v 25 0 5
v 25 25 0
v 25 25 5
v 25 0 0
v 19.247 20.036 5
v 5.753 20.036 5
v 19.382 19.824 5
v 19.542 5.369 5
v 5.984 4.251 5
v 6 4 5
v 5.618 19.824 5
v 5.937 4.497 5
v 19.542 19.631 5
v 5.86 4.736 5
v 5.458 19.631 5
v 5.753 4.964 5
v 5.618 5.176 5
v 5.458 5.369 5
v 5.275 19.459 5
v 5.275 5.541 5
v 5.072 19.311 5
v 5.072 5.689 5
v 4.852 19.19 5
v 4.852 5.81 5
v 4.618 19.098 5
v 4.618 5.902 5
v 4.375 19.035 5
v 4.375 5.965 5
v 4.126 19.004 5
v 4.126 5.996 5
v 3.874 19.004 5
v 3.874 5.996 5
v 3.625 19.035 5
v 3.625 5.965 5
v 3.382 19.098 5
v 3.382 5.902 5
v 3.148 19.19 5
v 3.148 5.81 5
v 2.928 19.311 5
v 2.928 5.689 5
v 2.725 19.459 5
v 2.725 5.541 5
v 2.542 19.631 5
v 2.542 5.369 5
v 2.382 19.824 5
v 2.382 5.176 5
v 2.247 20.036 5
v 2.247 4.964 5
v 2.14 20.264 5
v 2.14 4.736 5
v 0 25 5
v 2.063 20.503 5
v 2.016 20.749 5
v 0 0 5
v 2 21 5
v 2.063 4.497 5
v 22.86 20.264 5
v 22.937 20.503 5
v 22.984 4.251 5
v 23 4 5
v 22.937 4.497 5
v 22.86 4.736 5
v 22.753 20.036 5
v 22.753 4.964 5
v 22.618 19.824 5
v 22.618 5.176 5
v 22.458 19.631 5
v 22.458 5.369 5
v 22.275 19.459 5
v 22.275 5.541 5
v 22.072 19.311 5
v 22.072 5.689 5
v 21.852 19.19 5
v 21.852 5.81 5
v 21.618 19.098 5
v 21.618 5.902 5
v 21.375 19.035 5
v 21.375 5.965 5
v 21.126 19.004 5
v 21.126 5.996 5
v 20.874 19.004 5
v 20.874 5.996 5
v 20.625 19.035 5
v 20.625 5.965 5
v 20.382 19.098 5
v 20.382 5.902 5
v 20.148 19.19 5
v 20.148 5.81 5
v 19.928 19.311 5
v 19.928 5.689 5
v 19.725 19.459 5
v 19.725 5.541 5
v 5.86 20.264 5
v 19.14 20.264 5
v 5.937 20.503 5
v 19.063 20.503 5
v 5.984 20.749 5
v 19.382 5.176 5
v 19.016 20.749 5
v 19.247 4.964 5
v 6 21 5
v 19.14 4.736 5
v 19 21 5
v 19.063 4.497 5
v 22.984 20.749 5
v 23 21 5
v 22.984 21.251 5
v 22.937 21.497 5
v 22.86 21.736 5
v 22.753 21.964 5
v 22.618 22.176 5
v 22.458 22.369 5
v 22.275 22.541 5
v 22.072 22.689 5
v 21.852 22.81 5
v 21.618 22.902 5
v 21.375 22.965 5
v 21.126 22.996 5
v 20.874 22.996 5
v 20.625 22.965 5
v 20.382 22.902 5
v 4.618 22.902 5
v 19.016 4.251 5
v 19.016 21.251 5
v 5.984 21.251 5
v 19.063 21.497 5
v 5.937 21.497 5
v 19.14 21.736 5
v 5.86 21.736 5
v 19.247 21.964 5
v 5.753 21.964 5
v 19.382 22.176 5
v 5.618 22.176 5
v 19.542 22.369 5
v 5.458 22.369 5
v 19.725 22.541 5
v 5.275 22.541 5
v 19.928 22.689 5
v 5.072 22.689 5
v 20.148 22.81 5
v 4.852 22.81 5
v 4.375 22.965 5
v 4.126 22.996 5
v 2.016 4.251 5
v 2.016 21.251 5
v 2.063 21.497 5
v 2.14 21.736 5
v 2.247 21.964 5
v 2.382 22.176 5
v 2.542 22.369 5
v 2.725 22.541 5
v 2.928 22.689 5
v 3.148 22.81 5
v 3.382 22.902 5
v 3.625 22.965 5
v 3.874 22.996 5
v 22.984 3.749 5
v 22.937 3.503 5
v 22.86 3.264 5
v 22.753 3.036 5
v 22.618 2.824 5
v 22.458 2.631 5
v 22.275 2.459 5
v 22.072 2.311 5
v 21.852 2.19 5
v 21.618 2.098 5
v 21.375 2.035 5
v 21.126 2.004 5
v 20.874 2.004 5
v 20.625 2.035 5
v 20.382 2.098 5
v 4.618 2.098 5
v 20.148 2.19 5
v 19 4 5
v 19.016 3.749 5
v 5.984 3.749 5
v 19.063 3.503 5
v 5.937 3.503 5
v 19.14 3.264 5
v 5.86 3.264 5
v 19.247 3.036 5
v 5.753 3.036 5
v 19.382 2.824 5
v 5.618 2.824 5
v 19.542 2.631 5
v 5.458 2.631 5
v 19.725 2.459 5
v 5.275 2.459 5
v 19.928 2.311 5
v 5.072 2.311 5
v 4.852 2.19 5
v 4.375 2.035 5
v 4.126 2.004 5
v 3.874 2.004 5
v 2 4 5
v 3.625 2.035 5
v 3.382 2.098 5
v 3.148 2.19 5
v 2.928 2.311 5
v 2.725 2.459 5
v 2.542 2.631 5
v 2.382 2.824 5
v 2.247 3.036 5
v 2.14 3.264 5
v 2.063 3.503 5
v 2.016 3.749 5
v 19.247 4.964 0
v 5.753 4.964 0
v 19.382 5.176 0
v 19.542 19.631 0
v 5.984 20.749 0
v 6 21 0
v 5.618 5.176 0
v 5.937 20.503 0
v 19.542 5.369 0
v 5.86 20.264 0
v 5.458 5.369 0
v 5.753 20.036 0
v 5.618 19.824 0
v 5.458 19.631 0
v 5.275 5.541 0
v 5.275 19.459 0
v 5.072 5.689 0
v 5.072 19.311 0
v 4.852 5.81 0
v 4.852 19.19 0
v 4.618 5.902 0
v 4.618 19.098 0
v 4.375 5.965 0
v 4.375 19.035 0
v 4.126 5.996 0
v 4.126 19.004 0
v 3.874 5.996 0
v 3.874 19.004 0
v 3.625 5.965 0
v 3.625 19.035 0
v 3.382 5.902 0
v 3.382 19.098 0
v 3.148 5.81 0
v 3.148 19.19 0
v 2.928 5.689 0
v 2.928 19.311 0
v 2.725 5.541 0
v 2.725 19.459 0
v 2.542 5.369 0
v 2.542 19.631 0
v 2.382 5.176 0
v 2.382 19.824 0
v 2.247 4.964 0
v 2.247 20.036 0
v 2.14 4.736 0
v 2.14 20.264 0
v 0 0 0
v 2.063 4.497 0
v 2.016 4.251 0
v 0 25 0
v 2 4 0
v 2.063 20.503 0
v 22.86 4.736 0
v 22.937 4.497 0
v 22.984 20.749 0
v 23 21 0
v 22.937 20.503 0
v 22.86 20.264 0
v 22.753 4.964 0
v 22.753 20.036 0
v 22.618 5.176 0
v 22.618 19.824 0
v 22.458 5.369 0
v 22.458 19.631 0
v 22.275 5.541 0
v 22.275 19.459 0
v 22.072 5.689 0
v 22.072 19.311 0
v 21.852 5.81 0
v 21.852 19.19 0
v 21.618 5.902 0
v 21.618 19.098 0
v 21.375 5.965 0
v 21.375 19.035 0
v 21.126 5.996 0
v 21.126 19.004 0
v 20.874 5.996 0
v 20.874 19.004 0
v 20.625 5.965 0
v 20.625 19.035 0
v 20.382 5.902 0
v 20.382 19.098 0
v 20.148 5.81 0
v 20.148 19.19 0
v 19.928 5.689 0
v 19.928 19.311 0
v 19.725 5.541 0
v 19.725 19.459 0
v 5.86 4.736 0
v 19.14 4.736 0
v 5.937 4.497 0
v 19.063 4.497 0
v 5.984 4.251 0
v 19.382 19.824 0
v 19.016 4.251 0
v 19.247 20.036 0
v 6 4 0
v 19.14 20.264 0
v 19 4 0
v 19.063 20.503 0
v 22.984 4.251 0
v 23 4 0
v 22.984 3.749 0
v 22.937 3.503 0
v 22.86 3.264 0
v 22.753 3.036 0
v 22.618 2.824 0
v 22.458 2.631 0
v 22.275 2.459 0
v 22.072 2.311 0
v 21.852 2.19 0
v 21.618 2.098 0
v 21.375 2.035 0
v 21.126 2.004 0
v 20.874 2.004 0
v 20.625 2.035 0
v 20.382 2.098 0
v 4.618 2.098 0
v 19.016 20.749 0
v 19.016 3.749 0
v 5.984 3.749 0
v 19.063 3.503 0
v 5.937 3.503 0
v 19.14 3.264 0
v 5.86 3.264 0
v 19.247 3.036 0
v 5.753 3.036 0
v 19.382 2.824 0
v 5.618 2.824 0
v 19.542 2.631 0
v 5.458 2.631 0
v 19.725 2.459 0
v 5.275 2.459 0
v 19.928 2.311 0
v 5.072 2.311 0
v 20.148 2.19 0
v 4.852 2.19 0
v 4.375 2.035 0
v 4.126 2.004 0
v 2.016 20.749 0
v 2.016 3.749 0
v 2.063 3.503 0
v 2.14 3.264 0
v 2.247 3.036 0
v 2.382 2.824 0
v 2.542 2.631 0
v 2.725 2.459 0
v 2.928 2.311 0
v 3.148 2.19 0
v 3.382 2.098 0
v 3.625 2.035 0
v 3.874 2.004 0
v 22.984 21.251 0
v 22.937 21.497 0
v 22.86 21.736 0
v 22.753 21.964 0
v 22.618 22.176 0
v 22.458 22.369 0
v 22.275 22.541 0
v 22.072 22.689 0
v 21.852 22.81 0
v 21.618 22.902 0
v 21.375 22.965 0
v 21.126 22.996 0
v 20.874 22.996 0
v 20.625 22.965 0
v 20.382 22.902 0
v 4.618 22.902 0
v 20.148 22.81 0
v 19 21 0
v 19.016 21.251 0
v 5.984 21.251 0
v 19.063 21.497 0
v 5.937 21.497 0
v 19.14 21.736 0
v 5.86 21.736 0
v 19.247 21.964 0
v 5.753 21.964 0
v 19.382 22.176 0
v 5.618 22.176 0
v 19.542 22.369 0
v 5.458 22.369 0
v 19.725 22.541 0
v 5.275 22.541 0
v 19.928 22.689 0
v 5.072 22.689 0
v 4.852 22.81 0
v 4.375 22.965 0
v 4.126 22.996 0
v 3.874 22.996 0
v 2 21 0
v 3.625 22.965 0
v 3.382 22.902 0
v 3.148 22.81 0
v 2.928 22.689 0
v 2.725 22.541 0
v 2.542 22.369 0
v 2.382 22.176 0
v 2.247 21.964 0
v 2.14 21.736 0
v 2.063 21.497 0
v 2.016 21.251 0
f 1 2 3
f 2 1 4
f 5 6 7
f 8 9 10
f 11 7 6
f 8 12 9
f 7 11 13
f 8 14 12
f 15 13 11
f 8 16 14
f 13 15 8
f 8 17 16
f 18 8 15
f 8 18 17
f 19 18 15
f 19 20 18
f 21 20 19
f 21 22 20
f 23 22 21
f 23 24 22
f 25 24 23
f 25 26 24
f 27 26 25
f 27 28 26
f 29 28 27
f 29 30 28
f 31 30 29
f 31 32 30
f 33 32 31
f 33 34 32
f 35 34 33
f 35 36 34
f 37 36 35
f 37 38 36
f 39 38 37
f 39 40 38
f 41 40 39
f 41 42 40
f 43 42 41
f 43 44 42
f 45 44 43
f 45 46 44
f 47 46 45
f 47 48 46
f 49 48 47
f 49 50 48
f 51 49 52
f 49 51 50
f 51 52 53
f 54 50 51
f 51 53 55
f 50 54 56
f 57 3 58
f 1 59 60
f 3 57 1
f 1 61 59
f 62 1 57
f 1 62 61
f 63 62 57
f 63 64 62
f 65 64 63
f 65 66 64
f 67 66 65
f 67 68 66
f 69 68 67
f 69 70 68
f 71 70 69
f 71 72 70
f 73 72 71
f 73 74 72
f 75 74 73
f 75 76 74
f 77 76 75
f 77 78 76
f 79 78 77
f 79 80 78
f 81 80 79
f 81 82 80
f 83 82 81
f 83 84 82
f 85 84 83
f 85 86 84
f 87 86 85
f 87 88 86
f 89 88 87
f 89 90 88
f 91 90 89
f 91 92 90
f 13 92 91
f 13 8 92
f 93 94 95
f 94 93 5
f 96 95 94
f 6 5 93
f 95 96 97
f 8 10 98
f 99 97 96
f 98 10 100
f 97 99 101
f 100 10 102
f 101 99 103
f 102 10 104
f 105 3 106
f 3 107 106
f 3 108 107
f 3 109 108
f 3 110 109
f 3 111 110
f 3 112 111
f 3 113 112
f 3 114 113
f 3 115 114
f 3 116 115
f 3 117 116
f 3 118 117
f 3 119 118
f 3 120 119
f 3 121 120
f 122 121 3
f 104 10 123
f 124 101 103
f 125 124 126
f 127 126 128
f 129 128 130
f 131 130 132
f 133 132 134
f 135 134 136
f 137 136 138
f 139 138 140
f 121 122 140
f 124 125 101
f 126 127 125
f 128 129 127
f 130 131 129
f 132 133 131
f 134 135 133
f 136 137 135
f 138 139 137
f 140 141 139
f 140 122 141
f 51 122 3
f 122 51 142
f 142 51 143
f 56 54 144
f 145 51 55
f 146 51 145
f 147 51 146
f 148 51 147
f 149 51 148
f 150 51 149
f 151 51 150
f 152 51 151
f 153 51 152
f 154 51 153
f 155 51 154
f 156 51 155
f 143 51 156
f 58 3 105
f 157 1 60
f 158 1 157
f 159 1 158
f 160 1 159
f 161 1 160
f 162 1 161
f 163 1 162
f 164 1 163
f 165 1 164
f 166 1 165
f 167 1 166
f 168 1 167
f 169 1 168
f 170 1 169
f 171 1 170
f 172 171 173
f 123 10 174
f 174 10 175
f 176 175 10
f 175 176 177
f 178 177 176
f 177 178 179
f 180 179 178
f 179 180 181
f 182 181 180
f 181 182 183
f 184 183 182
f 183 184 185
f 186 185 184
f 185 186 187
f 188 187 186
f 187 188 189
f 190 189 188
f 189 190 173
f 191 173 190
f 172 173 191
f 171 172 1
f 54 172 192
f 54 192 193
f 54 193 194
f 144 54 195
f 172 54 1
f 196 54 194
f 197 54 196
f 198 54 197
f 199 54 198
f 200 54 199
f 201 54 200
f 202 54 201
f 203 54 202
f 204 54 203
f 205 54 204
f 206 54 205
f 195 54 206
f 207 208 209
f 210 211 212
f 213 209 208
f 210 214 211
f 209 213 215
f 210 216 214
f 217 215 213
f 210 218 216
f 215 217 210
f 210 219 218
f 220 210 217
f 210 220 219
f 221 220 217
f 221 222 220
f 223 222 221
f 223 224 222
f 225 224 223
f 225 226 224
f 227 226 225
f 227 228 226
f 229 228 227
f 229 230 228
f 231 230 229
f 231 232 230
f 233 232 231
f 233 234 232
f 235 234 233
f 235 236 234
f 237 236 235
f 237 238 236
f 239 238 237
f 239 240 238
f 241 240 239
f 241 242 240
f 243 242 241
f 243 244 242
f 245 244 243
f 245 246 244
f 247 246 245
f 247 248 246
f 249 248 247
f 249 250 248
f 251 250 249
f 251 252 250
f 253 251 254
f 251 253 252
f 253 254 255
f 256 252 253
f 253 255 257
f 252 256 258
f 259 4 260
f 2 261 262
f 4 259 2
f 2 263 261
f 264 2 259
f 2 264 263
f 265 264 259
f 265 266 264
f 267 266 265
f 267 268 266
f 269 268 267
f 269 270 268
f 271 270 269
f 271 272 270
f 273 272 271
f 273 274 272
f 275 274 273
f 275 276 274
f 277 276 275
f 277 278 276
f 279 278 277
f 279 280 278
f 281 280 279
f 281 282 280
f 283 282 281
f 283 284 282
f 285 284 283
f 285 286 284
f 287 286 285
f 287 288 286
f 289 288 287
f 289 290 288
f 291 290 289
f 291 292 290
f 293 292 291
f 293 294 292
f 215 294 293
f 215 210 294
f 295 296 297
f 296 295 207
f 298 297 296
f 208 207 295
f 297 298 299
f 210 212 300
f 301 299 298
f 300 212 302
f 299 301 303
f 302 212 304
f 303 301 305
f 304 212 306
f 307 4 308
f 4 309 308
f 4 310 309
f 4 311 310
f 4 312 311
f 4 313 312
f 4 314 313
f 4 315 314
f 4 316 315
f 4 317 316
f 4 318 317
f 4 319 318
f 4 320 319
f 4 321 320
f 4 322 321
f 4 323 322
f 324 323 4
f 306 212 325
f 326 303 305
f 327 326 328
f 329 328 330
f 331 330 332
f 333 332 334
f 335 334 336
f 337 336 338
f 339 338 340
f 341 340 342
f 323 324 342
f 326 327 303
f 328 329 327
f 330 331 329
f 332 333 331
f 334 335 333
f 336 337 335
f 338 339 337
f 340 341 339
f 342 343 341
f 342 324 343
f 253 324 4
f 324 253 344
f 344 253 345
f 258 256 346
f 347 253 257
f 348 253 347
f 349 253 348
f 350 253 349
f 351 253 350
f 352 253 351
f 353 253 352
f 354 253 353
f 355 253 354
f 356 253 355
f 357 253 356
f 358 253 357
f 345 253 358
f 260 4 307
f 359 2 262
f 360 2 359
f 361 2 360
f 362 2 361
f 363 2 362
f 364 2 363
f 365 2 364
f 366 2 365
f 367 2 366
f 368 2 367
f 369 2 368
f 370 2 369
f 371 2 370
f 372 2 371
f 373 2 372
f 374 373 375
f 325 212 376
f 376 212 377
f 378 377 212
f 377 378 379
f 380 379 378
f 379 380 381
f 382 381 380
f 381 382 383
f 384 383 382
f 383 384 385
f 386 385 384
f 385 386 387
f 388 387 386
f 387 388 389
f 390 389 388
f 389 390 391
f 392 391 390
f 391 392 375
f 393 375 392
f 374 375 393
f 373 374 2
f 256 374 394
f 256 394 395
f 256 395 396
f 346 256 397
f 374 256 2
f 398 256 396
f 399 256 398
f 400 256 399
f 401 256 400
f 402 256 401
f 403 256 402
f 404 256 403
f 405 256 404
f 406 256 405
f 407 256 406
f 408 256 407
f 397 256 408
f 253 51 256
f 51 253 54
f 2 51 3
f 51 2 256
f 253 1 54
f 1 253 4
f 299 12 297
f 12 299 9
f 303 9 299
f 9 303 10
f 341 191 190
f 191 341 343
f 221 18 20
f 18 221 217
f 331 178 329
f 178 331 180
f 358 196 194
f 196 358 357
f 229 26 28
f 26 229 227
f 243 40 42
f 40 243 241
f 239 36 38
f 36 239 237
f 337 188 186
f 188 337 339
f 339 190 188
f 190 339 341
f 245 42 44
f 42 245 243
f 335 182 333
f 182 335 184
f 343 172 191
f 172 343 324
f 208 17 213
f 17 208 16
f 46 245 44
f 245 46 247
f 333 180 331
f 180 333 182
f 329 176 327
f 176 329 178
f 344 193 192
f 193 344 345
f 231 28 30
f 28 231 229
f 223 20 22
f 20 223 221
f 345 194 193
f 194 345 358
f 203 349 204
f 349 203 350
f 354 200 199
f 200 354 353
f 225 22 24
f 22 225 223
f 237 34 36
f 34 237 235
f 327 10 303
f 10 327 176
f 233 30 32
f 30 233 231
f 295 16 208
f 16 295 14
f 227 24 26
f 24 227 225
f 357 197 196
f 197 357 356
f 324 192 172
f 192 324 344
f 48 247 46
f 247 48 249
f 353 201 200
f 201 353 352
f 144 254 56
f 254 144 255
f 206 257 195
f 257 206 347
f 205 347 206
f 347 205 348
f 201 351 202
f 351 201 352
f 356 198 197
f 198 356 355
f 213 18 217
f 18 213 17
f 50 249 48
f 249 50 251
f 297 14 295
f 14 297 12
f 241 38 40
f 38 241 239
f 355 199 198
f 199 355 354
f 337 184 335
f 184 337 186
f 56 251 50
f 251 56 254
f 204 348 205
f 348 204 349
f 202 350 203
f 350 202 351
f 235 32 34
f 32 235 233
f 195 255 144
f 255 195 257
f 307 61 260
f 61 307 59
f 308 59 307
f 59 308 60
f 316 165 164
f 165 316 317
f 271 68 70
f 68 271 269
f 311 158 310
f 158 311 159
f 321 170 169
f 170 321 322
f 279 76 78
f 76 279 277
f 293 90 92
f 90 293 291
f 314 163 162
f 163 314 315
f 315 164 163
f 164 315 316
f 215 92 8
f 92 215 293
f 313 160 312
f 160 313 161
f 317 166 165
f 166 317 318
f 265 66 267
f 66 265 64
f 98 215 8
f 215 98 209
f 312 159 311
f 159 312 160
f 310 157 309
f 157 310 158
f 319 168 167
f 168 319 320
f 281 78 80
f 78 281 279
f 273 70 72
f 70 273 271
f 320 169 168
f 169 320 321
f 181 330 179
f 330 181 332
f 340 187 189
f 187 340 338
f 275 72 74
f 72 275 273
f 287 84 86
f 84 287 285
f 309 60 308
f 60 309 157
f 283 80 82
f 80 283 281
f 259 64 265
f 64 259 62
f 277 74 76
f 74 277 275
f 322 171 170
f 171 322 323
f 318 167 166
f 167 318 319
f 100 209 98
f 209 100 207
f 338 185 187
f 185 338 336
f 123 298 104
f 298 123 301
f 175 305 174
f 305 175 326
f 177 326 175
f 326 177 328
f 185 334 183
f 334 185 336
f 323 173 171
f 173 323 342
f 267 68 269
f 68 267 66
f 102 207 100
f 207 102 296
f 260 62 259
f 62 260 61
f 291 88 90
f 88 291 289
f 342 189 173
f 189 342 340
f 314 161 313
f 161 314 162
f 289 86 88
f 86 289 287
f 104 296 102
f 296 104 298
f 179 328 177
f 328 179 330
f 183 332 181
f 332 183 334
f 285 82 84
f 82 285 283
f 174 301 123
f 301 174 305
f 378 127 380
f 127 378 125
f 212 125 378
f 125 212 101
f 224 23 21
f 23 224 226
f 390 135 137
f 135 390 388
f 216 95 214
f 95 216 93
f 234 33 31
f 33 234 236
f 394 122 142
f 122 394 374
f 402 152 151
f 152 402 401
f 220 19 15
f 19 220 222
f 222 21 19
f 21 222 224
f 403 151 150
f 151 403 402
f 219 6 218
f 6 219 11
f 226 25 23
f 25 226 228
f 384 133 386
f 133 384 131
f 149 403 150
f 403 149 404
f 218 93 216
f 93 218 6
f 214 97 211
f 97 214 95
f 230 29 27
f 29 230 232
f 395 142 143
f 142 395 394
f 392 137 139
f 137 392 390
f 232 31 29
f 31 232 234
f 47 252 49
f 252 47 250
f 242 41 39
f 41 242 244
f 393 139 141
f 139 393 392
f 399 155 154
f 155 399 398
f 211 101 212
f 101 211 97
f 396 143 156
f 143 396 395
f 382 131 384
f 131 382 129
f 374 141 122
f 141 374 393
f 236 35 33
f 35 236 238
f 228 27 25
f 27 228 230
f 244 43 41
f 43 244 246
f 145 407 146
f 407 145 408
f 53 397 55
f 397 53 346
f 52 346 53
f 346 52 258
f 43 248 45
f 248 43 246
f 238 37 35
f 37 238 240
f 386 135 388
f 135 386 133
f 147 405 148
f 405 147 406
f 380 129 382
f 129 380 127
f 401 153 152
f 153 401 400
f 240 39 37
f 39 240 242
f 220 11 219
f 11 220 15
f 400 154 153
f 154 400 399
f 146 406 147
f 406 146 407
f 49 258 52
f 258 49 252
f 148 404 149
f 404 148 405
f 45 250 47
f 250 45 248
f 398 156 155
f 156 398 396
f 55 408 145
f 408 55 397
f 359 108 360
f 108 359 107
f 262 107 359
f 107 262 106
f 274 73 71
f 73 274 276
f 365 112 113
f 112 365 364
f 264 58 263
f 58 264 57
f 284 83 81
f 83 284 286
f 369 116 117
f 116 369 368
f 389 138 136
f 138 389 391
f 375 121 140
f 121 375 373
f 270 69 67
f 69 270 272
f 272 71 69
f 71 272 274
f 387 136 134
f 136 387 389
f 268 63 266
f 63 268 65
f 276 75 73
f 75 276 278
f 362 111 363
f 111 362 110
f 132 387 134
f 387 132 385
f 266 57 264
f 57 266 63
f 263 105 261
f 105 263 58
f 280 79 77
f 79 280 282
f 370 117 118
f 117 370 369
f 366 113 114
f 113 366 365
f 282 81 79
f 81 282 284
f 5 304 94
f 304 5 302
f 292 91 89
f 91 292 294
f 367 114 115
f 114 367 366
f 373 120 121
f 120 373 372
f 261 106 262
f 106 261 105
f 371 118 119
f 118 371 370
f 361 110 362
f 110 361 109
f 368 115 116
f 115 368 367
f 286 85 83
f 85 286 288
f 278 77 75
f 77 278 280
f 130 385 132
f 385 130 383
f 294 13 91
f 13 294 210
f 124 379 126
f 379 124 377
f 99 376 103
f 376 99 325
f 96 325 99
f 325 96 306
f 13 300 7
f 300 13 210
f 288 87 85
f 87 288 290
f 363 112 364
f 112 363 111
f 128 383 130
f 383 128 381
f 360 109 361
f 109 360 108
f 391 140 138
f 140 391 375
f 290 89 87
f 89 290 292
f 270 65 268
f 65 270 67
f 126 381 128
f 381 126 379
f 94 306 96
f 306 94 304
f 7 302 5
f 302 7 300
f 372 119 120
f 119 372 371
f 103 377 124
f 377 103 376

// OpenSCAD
$fn=50;

w=25;   // size of square
thick=5;  // thickness
drillhole_r=2;  // radius of drill hole
drilloff=2;   // offset from edge of drill hole


difference()
{
cube([w,w,thick]);
translate([drilloff+drillhole_r,drilloff+drillhole_r,-1]) cylinder(h=thick+2,r=drillhole_r);
translate([w-(drilloff+drillhole_r),drilloff+drillhole_r,-1]) cylinder(h=thick+2,r=drillhole_r);
translate([drilloff+drillhole_r,w-(drilloff+drillhole_r),-1]) cylinder(h=thick+2,r=drillhole_r);
translate([w-(drilloff+drillhole_r),w-(drilloff+drillhole_r),-1]) cylinder(h=thick+2,r=drillhole_r);
}
